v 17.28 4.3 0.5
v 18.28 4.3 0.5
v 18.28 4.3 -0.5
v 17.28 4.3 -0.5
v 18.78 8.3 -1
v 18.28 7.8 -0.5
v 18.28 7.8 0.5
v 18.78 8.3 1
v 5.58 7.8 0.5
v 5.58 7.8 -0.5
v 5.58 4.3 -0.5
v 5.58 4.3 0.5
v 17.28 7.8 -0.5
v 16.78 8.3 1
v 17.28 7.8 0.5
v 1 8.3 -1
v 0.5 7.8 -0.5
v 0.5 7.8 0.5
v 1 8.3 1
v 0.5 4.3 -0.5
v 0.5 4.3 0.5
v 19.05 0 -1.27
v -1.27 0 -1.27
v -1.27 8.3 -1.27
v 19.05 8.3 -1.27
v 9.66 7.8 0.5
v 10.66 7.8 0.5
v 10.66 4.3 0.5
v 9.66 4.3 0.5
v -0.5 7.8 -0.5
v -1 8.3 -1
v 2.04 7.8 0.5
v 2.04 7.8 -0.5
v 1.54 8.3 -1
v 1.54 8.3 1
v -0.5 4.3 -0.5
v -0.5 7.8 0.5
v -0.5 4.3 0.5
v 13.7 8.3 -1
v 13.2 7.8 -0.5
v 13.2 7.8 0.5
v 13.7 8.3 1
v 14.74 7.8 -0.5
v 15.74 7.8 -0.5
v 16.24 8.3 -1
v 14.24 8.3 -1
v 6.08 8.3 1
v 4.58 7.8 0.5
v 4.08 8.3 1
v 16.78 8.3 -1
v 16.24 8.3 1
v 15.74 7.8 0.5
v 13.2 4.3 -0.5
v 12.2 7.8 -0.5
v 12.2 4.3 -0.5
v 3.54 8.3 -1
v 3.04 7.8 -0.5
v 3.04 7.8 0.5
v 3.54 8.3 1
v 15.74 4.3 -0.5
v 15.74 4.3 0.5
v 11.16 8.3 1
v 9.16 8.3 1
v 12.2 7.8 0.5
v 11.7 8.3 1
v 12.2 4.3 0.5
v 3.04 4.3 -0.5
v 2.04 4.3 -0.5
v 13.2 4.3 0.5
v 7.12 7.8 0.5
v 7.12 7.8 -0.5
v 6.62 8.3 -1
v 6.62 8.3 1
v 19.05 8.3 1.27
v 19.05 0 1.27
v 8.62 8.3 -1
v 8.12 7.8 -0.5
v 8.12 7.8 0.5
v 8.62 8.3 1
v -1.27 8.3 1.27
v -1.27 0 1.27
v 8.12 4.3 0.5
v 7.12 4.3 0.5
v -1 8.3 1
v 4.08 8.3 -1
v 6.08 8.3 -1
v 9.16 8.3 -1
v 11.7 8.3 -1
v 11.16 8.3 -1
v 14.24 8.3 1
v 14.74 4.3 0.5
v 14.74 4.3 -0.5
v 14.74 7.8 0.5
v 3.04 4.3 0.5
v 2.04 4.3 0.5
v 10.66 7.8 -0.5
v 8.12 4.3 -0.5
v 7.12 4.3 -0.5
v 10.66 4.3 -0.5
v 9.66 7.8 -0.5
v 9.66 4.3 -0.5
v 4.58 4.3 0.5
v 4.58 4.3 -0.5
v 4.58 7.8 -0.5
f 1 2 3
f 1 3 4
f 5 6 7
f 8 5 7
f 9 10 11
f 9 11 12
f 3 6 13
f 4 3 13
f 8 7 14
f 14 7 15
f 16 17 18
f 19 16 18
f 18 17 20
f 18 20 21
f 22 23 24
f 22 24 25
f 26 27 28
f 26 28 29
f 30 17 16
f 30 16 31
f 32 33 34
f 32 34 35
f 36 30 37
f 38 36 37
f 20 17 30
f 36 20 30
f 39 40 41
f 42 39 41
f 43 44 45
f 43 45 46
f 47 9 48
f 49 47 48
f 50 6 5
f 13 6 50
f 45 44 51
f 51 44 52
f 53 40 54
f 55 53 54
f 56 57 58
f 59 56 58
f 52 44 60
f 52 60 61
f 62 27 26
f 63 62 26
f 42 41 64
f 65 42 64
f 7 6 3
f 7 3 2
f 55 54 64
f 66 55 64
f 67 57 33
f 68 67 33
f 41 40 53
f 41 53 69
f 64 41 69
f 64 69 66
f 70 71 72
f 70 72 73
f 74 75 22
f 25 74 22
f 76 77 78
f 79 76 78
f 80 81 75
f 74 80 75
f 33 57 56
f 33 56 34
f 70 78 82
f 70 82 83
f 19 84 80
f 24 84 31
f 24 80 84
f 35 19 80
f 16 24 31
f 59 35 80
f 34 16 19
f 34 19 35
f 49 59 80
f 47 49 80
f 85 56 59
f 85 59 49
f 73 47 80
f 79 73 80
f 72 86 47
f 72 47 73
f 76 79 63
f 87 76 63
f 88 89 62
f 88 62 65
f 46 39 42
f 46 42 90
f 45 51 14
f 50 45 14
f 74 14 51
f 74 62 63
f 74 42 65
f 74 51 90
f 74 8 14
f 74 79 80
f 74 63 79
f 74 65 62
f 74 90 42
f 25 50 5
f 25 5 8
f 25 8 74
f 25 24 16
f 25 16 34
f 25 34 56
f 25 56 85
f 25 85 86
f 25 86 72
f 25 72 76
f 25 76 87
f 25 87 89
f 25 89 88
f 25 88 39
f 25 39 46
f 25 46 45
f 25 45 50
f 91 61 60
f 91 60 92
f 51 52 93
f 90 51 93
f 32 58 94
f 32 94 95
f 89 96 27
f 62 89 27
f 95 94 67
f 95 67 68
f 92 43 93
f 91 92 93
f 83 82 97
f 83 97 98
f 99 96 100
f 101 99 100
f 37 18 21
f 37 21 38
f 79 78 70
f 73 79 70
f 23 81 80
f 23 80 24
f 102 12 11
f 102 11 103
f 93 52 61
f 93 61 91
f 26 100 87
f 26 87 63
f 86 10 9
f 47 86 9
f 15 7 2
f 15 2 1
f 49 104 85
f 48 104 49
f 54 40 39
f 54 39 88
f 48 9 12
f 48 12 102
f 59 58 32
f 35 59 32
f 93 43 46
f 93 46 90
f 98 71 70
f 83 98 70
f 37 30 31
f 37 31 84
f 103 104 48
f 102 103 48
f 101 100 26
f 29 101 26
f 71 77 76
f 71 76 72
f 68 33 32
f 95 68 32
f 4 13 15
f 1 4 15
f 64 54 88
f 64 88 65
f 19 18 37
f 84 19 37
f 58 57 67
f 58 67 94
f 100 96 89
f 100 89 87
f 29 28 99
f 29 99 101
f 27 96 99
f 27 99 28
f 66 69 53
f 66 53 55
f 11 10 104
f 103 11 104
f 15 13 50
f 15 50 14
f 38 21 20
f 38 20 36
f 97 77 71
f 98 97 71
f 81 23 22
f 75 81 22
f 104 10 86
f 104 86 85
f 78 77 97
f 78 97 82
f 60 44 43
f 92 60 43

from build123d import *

# Parameters (mm, degrees)
SKETCH1_W                  = 2.54
SKETCH1_H                  = 2.54
BOSS_EXTRUDE1_DEPTH        = 8.3
SKETCH2_W                  = 1
SKETCH2_H                  = 1
CUT_EXTRUDE1_DEPTH         = 4
CHAMFER1_SIZE              = 0.5
LPATTERN1_COUNT            = 8
LPATTERN1_PITCH            = 2.54
CHAMFER1_OF_LPATTERN1_SIZE = 0.5


with BuildPart() as part:
    # Sketch1 → Boss-Extrude1 (new body)
    with BuildSketch(Plane(origin=(0, 0, 0), x_dir=(1, 0, 0), z_dir=(0, 1, 0))):
        Rectangle(SKETCH1_W, SKETCH1_H)
    boss_extrude1 = extrude(amount=BOSS_EXTRUDE1_DEPTH)

    # Sketch2 → Cut-Extrude1 (cut)
    with BuildSketch(Plane(origin=(0, 8.3, 0), x_dir=(-1, 0, 0), z_dir=(0, 1, 0))):
        Rectangle(SKETCH2_W, SKETCH2_H)
    cut_extrude1 = extrude(amount=-CUT_EXTRUDE1_DEPTH, mode=Mode.SUBTRACT)

    # Chamfer1
    chamfer1_edges = [part.edges().sort_by_distance(p)[0] for p in [
        (0, 8.3, 0.5),
        (0.5, 8.3, 0),
        (0, 8.3, -0.5),
        (-0.5, 8.3, 0),
    ]]
    chamfer(chamfer1_edges, length=CHAMFER1_SIZE)

    # LPattern1: Boss-Extrude1, Cut-Extrude1 ×8
    with Locations(*[(i * LPATTERN1_PITCH, 0, 0) for i in range(1, LPATTERN1_COUNT)]):
        add(boss_extrude1)
        add(cut_extrude1, mode=Mode.SUBTRACT)

    # Chamfer1 of LPattern1
    chamfer1_of_lpattern1_edges = [part.edges().sort_by_distance(p)[0] for p in [
        (2.54, 8.3, 0.5),
        (3.04, 8.3, 0),
        (2.54, 8.3, -0.5),
        (2.04, 8.3, 0),
        (5.08, 8.3, 0.5),
        (5.58, 8.3, 0),
        (5.08, 8.3, -0.5),
        (4.58, 8.3, 0),
        (7.62, 8.3, 0.5),
        (8.12, 8.3, 0),
        (7.62, 8.3, -0.5),
        (7.12, 8.3, 0),
        (10.16, 8.3, 0.5),
        (10.66, 8.3, 0),
        (10.16, 8.3, -0.5),
        (9.66, 8.3, 0),
        (12.7, 8.3, 0.5),
        (13.2, 8.3, 0),
        (12.7, 8.3, -0.5),
        (12.2, 8.3, 0),
        (15.24, 8.3, 0.5),
        (15.74, 8.3, 0),
        (15.24, 8.3, -0.5),
        (14.74, 8.3, 0),
        (17.78, 8.3, 0.5),
        (18.28, 8.3, 0),
        (17.78, 8.3, -0.5),
        (17.28, 8.3, 0),
    ]]
    chamfer(chamfer1_of_lpattern1_edges, length=CHAMFER1_OF_LPATTERN1_SIZE)


solid = part.part
